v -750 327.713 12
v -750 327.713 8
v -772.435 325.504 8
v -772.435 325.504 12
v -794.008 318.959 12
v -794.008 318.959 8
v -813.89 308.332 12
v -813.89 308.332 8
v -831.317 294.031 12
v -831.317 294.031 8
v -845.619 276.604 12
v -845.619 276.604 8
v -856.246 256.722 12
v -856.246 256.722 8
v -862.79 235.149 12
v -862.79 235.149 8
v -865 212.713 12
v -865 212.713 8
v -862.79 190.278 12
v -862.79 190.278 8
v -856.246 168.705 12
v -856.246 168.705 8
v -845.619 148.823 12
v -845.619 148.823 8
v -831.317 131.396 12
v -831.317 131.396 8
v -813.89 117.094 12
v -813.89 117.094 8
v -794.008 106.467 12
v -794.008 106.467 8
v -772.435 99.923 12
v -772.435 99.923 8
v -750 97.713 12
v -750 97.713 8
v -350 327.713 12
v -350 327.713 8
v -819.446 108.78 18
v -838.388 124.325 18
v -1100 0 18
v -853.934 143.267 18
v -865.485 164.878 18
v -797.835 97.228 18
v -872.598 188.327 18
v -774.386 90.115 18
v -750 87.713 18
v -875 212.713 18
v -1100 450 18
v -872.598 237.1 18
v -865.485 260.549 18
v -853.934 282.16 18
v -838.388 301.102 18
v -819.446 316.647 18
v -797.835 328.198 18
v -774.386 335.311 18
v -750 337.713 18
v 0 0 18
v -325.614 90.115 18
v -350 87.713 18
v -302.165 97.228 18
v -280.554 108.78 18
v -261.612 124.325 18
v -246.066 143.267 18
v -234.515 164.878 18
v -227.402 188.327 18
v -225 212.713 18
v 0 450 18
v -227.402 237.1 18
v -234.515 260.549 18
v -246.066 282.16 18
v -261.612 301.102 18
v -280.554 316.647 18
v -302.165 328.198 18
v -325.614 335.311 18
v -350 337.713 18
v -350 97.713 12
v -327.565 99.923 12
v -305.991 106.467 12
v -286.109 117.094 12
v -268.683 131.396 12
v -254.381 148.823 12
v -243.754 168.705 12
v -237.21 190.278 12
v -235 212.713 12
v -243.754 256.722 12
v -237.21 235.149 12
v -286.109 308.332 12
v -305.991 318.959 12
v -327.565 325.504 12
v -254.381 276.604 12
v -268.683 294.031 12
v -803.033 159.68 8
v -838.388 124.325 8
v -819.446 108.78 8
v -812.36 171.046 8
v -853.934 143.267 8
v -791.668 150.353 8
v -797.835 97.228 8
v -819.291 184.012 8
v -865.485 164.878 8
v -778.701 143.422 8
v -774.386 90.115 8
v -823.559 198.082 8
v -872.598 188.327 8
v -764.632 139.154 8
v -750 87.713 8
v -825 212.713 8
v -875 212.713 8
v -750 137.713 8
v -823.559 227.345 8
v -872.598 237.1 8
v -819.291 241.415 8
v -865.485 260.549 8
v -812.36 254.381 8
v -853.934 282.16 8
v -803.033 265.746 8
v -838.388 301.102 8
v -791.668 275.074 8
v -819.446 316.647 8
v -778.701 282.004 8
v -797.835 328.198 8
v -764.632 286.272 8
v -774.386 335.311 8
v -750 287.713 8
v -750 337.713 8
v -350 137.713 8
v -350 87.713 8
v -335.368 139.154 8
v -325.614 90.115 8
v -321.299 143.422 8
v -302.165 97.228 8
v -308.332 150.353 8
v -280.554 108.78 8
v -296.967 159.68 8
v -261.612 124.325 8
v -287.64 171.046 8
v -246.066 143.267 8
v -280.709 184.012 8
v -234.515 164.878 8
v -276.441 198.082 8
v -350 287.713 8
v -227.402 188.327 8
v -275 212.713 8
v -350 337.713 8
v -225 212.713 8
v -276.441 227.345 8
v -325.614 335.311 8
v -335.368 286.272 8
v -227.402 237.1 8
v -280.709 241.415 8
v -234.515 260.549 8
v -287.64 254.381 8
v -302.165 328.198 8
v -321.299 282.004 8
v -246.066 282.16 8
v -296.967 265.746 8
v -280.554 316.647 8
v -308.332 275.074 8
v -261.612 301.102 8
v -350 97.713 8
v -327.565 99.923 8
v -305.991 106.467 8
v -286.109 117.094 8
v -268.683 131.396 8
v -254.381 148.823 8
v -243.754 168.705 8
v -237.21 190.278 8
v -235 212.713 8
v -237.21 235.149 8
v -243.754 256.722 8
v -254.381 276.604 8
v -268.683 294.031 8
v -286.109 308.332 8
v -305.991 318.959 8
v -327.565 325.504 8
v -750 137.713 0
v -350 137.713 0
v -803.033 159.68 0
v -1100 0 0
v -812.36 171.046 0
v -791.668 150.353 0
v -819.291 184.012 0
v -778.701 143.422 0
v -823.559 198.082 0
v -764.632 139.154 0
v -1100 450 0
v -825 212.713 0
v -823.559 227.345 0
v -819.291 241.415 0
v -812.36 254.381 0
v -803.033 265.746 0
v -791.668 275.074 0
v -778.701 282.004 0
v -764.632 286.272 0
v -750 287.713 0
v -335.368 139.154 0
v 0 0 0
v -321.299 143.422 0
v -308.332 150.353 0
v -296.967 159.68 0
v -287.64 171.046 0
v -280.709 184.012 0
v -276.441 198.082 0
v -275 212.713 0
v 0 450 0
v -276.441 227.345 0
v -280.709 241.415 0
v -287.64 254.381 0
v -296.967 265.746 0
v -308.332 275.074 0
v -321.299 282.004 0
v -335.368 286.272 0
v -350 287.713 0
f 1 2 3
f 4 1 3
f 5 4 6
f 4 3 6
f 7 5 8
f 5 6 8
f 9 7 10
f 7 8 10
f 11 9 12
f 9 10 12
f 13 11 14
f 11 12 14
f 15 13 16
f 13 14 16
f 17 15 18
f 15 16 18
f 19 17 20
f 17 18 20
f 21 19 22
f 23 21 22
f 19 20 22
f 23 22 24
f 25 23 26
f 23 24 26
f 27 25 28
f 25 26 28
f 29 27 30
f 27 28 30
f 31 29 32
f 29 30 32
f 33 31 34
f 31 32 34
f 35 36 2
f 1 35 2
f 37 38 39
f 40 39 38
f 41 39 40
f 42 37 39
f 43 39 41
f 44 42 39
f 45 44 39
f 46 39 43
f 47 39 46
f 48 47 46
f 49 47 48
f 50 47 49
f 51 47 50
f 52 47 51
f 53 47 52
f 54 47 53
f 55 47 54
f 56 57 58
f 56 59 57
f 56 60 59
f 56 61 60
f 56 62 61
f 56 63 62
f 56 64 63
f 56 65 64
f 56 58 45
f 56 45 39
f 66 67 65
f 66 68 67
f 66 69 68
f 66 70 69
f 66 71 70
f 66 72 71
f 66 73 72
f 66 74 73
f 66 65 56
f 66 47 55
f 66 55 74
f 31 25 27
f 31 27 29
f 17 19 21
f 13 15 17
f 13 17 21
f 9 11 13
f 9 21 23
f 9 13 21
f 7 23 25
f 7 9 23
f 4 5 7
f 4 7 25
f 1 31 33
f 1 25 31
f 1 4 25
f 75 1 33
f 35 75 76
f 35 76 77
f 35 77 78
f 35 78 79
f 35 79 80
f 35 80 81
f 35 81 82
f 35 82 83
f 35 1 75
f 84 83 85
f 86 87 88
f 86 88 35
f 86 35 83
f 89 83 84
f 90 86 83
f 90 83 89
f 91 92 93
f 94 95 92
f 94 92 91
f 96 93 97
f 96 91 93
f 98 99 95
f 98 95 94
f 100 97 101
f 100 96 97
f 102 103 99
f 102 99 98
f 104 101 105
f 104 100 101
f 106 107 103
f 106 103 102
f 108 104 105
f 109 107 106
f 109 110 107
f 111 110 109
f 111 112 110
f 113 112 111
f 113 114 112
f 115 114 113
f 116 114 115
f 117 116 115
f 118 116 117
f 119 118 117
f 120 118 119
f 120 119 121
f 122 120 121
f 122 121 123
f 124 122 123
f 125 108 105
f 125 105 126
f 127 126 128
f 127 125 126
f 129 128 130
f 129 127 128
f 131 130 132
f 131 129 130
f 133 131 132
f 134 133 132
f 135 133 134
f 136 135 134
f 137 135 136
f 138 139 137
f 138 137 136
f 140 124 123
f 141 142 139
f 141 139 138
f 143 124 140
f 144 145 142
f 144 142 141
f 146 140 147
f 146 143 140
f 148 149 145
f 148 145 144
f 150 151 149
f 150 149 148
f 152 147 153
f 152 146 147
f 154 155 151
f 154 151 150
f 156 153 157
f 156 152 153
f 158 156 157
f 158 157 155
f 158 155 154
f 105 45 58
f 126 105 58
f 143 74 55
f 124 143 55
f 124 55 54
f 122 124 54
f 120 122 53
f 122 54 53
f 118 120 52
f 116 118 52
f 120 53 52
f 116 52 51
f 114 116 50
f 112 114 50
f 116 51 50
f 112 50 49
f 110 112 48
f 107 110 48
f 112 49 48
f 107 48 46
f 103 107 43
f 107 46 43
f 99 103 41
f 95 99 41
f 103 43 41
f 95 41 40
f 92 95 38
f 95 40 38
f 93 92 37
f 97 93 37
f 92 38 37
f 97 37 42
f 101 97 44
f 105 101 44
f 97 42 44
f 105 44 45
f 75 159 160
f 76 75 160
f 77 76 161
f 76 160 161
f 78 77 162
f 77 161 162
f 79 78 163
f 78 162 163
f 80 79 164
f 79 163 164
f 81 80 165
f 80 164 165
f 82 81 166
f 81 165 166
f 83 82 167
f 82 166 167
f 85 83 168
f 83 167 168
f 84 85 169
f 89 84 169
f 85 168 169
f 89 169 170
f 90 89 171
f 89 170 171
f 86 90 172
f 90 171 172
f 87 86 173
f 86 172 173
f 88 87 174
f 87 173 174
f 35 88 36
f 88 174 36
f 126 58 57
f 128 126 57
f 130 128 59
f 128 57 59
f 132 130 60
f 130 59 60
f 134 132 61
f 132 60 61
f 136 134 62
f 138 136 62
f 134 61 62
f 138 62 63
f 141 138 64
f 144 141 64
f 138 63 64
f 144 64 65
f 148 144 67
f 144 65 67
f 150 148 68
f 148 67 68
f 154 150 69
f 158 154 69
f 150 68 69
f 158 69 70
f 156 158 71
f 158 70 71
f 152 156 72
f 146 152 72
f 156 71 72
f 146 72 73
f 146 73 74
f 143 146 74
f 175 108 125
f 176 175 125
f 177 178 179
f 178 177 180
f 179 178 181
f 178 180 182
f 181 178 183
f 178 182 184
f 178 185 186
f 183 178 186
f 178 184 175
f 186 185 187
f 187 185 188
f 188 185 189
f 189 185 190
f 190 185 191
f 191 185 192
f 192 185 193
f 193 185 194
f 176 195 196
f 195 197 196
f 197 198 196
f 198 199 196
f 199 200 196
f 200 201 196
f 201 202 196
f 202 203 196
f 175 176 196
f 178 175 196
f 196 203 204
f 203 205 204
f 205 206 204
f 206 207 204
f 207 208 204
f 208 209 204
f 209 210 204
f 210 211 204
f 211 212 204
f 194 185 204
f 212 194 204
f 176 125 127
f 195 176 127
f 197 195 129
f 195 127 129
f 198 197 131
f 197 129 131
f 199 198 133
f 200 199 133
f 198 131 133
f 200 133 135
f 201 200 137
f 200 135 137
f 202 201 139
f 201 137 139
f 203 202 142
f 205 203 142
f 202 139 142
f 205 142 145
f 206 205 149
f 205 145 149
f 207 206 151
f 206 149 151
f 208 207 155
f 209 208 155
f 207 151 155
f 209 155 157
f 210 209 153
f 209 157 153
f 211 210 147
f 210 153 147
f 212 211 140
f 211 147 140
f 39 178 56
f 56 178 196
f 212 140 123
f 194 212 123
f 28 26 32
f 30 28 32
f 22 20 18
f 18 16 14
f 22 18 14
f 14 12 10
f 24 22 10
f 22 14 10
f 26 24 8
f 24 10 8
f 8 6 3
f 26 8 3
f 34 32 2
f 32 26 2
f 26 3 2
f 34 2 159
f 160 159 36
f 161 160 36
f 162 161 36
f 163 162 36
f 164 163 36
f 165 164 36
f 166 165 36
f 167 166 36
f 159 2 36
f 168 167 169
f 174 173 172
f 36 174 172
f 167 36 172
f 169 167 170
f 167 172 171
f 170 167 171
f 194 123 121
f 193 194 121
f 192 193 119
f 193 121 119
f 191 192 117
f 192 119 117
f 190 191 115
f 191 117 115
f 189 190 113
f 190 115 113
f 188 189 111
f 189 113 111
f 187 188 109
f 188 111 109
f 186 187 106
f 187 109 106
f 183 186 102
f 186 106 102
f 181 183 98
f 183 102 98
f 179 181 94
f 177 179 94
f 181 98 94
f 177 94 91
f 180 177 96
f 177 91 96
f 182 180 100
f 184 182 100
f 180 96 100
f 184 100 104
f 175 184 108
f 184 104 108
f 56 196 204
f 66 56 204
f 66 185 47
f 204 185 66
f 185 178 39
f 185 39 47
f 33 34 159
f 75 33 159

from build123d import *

# Parameters (mm, degrees)
F0_W     = 1100
F0_H     = 450
F1_DEPTH = 18
F3_DEPTH = 18.001
F5_DEPTH = 10
F7_DEPTH = 4


with BuildPart() as f1:
    # F0 (on Top) → F1 (new body)
    with BuildSketch(Plane.XY):
        with Locations((-550, 225)):
            Rectangle(F0_W, F0_H)
    extrude(amount=F1_DEPTH)

    # F2 (on face) → F3 (cut, through all)
    with BuildSketch(Plane.XY.offset(18)):
        with BuildLine():
            Line((-349.999957, 287.713336), (-749.999957, 287.713336))
            ThreePointArc((-749.999957, 287.713336), (-824.999844, 212.713279), (-749.999844, 137.713336))
            Line((-749.999844, 137.713336), (-350, 137.713336))
            ThreePointArc((-350, 137.713336), (-275, 212.713315), (-349.999957, 287.713336))
        make_face()
    extrude(amount=-F3_DEPTH, mode=Mode.SUBTRACT)

    # F4 (on face) → F5 (cut)
    with BuildSketch(Plane.XY.offset(18)):
        with BuildLine():
            ThreePointArc((-350, 87.713336), (-225, 212.713336), (-350, 337.713336))
            Line((-350, 337.713336), (-749.999844, 337.713336))
            ThreePointArc((-749.999844, 337.713336), (-874.999844, 212.713336), (-749.999844, 87.713336))
            Line((-749.999844, 87.713336), (-350, 87.713336))
        make_face()
    extrude(amount=-F5_DEPTH, mode=Mode.SUBTRACT)


with BuildPart() as f7:
    # F6 (on face) → F7 (new body)
    with BuildSketch(Plane.XY.offset(8)):
        with BuildLine():
            Line((-350, 327.713336), (-749.999844, 327.713336))
            ThreePointArc((-749.999844, 327.713336), (-864.999844, 212.713336), (-749.999844, 97.713336))
            Line((-749.999844, 97.713336), (-350, 97.713336))
            ThreePointArc((-350, 97.713336), (-235, 212.713336), (-350, 327.713336))
        make_face()
    extrude(amount=F7_DEPTH)


solid = Compound([f1.part, f7.part])
